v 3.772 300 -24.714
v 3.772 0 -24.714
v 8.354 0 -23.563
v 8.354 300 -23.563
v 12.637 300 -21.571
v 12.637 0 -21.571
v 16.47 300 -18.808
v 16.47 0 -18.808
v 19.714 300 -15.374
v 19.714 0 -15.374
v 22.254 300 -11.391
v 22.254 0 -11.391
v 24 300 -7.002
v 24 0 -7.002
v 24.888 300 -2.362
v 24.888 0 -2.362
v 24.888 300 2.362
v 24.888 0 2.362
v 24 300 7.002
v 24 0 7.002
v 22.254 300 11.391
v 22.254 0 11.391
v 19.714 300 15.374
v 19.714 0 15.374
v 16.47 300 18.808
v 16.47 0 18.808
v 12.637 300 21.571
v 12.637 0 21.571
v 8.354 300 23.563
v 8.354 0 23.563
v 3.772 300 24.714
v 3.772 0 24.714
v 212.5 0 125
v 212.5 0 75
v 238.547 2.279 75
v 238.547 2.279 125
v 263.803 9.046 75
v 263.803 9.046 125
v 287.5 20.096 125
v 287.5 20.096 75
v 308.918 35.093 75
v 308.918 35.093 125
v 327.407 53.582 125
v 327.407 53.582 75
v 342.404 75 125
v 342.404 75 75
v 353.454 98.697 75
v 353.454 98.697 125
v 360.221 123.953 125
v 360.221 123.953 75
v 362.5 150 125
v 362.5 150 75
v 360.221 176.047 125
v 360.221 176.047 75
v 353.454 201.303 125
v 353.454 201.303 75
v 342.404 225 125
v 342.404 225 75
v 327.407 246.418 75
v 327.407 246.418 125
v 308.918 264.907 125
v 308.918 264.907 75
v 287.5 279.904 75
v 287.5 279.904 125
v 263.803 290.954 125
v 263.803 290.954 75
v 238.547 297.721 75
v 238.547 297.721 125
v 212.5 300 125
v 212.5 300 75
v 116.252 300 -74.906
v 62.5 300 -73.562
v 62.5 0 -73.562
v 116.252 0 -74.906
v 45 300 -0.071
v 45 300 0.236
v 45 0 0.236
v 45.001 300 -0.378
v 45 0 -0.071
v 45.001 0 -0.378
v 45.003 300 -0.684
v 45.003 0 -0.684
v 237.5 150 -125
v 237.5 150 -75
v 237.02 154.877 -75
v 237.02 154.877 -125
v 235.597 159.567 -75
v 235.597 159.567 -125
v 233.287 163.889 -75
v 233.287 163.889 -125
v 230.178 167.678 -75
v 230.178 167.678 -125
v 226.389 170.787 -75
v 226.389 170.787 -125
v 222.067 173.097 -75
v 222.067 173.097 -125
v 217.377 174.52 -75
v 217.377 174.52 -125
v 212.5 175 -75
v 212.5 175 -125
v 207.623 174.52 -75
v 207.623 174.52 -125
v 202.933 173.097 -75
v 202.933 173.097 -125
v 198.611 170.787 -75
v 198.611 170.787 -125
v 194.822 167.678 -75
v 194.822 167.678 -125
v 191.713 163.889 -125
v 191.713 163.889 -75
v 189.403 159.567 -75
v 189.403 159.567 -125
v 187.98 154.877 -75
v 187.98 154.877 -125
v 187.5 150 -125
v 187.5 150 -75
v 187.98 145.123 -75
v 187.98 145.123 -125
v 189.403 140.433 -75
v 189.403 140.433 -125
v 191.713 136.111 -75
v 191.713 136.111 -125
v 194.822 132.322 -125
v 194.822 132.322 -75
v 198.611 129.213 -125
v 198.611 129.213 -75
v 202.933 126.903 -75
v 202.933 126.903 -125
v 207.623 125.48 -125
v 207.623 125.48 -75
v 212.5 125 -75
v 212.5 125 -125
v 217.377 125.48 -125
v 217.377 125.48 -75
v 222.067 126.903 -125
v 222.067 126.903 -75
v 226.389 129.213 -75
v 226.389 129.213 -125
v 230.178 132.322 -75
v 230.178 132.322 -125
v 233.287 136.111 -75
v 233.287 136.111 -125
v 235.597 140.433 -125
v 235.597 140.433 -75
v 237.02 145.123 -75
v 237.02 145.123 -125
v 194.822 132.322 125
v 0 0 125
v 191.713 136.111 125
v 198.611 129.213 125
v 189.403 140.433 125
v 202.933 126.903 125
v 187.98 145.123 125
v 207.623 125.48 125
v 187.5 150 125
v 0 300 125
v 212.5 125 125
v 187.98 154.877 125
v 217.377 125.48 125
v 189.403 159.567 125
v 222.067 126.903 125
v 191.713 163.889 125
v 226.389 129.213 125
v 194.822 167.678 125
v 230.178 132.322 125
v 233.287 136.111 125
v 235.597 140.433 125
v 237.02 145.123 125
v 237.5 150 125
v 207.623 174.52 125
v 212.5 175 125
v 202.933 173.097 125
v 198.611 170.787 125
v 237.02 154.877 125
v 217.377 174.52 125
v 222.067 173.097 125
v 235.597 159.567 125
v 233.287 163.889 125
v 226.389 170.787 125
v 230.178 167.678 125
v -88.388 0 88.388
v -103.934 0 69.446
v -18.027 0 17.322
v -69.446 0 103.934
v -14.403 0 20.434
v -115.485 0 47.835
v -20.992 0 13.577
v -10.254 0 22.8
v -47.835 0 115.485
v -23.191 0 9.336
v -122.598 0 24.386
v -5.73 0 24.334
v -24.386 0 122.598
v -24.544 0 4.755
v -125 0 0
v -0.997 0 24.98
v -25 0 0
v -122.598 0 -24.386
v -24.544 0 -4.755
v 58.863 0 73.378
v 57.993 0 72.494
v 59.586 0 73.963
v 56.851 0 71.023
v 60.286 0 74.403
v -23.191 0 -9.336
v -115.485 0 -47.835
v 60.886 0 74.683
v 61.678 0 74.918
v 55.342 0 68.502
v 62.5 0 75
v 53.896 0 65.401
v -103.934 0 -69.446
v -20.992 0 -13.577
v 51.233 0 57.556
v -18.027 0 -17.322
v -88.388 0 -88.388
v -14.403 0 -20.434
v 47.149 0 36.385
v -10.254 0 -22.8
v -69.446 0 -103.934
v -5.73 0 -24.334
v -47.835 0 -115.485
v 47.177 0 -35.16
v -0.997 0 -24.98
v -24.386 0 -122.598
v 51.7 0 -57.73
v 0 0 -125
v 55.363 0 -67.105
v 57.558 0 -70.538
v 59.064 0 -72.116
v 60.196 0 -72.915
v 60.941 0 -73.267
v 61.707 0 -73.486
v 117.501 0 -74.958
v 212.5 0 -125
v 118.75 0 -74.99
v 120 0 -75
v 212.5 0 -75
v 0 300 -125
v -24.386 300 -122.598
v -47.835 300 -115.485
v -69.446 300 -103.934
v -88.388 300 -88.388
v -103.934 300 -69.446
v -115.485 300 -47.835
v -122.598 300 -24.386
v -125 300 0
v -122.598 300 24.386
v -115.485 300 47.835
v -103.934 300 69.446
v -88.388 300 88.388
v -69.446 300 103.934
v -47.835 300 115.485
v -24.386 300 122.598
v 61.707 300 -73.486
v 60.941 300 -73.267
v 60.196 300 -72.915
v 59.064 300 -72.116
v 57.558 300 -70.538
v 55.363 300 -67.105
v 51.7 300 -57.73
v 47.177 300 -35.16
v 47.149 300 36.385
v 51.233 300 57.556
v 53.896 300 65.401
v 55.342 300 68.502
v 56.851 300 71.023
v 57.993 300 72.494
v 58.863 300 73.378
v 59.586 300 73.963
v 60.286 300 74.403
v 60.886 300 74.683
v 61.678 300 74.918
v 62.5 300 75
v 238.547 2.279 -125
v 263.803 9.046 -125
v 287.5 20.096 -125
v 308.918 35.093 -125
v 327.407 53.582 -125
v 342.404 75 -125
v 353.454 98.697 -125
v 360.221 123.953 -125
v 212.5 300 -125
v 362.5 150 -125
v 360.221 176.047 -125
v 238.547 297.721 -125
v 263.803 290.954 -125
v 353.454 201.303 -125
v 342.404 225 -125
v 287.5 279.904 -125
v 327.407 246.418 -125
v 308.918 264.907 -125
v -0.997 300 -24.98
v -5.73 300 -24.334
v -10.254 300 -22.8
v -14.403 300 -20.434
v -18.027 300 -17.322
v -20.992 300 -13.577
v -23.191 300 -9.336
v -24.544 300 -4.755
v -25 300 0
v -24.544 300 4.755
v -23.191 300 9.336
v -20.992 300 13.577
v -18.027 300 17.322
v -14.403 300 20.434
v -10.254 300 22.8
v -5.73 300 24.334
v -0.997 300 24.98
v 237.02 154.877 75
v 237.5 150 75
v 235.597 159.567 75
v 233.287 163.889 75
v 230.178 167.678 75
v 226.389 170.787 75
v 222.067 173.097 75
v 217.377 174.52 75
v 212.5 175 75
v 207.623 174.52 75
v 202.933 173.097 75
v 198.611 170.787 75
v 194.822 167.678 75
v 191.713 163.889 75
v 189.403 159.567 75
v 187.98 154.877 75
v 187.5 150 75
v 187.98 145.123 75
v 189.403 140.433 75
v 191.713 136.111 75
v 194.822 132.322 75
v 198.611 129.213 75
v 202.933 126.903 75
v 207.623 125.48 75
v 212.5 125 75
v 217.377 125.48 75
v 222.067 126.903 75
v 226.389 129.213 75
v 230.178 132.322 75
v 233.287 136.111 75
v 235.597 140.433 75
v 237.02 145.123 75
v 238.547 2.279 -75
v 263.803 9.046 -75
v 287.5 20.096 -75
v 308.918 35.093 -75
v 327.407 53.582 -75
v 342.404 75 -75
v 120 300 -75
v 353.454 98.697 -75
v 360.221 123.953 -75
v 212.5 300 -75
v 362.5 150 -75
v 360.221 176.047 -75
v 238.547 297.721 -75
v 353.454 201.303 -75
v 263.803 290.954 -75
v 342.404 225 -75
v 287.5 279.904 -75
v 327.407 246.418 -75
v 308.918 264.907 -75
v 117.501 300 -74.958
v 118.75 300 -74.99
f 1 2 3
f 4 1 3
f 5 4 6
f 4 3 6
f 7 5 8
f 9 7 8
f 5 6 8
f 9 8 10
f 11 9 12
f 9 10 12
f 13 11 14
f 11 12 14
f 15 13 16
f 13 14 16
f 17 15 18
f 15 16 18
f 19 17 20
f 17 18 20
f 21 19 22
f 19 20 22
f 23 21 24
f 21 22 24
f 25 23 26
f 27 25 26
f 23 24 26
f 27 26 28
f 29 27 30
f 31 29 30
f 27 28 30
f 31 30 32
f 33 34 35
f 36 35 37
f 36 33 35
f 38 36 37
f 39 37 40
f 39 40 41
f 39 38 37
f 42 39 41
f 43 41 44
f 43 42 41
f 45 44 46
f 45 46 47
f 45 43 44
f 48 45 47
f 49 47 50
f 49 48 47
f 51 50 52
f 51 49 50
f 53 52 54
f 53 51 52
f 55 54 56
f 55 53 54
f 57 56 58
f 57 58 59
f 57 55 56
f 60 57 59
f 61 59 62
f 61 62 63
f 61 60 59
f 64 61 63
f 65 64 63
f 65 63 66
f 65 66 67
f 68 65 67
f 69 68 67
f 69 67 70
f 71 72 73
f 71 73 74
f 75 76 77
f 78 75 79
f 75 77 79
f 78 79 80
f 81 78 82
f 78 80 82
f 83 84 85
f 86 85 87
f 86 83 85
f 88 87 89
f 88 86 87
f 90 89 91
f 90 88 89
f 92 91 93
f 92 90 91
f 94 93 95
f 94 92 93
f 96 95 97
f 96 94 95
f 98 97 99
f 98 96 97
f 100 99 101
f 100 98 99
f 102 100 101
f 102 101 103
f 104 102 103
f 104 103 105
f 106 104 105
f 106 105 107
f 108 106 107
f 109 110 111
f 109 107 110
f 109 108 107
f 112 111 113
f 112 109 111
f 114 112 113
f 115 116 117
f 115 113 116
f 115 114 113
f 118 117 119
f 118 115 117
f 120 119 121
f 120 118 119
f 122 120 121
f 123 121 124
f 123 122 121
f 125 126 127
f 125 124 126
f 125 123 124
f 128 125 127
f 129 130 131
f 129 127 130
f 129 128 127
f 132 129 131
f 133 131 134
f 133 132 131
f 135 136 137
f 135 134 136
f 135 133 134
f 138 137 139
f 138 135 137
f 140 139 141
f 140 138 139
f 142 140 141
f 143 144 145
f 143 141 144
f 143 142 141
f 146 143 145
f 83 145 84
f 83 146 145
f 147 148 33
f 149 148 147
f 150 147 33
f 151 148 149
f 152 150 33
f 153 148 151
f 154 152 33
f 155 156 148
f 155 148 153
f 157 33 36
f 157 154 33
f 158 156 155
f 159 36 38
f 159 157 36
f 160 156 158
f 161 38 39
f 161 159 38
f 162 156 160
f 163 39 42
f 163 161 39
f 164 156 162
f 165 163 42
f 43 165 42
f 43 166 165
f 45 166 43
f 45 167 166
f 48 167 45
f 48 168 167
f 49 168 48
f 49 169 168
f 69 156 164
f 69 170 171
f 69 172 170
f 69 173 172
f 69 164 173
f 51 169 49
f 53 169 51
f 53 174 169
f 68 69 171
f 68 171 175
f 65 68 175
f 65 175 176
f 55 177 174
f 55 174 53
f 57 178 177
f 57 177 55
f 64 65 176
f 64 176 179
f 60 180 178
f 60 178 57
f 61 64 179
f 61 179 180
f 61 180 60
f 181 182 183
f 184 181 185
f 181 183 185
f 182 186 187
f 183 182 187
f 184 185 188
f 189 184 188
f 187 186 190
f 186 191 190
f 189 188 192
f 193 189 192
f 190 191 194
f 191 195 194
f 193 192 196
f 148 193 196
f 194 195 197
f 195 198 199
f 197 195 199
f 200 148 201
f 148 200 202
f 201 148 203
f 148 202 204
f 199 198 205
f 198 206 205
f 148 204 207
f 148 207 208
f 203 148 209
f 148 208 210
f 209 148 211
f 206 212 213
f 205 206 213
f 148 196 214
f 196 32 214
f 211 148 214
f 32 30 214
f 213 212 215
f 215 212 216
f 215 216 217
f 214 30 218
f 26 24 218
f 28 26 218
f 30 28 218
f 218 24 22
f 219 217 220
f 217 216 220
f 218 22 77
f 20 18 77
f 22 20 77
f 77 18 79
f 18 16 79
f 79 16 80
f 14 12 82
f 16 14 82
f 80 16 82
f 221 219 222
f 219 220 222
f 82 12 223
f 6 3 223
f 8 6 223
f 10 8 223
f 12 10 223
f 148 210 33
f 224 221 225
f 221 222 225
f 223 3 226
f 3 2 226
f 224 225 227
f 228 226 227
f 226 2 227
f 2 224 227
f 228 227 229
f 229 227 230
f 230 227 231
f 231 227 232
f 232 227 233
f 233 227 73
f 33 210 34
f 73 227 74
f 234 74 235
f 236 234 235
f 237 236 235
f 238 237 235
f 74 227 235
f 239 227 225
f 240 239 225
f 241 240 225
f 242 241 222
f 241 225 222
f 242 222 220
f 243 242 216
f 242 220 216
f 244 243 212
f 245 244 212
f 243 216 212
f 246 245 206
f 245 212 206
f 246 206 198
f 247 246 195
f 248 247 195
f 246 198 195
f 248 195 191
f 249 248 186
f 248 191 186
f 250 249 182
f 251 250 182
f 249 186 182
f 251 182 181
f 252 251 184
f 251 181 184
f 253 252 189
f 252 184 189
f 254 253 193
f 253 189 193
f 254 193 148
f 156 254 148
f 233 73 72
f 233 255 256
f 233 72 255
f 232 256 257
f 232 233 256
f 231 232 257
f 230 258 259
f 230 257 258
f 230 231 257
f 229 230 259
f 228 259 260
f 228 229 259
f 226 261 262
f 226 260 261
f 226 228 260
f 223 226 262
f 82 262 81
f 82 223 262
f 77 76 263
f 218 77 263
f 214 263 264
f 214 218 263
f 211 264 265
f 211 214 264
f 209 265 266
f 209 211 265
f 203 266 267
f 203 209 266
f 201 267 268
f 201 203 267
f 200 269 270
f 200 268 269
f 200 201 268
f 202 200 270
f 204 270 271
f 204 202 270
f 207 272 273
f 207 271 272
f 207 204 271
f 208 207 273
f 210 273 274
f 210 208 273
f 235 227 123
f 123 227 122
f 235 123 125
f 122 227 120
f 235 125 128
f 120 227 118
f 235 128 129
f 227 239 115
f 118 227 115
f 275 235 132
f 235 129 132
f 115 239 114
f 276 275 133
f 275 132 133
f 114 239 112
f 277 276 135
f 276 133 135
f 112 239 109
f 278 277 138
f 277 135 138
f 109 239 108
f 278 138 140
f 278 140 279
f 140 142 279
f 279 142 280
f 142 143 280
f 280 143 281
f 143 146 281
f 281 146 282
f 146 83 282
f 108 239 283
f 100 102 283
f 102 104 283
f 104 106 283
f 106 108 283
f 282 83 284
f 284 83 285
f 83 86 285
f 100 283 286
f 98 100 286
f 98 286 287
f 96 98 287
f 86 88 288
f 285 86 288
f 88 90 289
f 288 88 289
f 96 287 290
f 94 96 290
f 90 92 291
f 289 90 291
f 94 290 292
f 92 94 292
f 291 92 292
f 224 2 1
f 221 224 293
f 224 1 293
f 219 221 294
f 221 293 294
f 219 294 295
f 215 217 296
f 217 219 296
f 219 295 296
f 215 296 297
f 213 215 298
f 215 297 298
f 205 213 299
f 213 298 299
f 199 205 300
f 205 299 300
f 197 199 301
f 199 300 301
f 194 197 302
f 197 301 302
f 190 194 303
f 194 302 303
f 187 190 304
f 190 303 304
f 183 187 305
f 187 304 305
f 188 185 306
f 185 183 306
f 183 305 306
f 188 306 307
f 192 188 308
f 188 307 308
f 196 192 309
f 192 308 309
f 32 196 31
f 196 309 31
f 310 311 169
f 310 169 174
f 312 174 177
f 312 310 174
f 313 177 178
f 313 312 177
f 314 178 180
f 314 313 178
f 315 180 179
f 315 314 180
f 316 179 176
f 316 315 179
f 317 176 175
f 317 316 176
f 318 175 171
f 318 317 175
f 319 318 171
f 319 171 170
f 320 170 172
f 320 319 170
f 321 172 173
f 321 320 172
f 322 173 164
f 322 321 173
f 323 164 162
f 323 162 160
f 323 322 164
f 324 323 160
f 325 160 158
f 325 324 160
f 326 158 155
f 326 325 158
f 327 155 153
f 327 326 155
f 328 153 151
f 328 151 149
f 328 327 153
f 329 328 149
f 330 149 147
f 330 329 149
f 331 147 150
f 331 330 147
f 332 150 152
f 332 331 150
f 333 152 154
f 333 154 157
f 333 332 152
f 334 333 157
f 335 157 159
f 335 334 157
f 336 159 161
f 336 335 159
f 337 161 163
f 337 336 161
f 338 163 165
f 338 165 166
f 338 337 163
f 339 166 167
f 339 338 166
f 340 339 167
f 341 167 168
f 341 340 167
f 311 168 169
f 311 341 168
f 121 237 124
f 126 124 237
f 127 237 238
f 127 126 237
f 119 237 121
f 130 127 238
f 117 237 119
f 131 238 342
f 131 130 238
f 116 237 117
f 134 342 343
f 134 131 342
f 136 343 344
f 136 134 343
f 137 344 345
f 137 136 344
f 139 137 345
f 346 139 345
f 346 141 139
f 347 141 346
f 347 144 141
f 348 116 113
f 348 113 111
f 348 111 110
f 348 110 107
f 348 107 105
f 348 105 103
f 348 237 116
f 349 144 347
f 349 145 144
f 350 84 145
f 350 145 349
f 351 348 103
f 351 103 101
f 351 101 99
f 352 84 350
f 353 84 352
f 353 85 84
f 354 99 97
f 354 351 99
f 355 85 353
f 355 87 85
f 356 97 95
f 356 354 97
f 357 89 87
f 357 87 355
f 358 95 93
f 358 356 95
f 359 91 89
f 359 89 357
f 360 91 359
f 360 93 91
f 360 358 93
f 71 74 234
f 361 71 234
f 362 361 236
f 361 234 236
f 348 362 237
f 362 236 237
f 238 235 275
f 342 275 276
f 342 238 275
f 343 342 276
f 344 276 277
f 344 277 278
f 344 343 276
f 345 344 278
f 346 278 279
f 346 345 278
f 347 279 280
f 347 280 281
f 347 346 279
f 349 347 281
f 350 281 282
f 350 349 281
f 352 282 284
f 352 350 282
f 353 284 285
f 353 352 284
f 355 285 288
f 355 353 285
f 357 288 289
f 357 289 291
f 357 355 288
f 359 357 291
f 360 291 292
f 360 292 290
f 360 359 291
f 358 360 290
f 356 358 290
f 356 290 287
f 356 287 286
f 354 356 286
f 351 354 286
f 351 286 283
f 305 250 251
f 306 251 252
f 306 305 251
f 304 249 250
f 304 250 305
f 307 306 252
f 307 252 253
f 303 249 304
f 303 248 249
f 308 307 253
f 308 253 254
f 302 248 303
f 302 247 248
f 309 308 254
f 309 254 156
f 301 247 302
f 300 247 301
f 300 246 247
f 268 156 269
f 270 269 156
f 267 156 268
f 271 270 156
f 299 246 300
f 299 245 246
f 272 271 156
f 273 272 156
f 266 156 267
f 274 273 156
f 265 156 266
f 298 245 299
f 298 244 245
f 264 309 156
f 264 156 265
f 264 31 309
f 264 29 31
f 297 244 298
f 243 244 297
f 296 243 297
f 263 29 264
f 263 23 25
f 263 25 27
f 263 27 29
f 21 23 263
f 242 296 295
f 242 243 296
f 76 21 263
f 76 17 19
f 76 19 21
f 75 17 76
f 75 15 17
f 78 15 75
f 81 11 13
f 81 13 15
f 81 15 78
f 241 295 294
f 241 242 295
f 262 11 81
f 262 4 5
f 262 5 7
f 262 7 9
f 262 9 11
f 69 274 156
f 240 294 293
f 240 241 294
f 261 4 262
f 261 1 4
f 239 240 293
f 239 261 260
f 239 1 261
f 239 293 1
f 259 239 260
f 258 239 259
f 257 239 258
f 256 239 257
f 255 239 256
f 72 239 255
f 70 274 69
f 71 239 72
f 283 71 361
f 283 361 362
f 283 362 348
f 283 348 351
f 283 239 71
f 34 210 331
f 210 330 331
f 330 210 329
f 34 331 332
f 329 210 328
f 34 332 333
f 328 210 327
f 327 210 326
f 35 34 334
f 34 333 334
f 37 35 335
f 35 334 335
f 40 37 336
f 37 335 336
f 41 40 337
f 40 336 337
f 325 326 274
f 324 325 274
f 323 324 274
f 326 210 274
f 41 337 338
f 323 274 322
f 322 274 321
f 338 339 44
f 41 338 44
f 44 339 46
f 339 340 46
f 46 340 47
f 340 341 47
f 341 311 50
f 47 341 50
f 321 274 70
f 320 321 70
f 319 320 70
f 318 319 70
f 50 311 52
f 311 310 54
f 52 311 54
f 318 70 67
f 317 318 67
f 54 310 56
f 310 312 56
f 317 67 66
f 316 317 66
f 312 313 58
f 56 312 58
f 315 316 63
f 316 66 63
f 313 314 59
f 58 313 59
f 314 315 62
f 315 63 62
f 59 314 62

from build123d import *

# Parameters (mm, degrees)
SKETCH1_R               = 125
SKETCH1_R_2             = 25
BOSS_EXTRUDE1_DEPTH     = 300
SKETCH2_R               = 25
BOSS_EXTRUDE2_DEPTH     = 125
CUT_EXTRUDE2_DEPTH      = 75
BOSS_EXTRUDE3_DEPTH     = 300
SKETCH6_R               = 25
CUT_EXTRUDE3_DEPTH      = 487.858552354
CUT_EXTRUDE4_DEPTH      = 487.858552354
CUT_EXTRUDE4_DEPTH_BACK = 487.858552354


with BuildPart() as part:
    # Sketch1 → Boss-Extrude1 (new body)
    with BuildSketch(Plane(origin=(0, 0, 0), x_dir=(1, 0, 0), z_dir=(0, 1, 0))):
        with Locations(Location((0, 0, 0), (0, 0, 270))):
            Circle(SKETCH1_R)
        with Locations(Location((0, 0, 0), (0, 0, 270))):
            Circle(SKETCH1_R_2, mode=Mode.SUBTRACT)
    extrude(amount=BOSS_EXTRUDE1_DEPTH)

    # Sketch2 → Boss-Extrude2 (add, symmetric)
    with BuildSketch(Plane.XY):
        with BuildLine():
            Line((0, 300), (0, 0))
            Line((0, 0), (212.5, 0))
            ThreePointArc((212.5, 0), (362.5, 150), (212.5, 300))
            Line((212.5, 300), (0, 300))
        make_face()
        with Locations((212.5, 150)):
            Circle(SKETCH2_R, mode=Mode.SUBTRACT)
    extrude(amount=BOSS_EXTRUDE2_DEPTH, both=True)

    # Sketch4 → Cut-Extrude2 (cut, symmetric)
    with BuildSketch(Plane.XY):
        with BuildLine():
            Line((3.772306617, 300), (3.772306617, 0))
            Line((3.772306617, 0), (150, 0))
            ThreePointArc((150, 0), (375, 150), (150, 300))
            Line((150, 300), (3.772306617, 300))
        make_face()
    extrude(amount=CUT_EXTRUDE2_DEPTH, both=True, mode=Mode.SUBTRACT)

    # Sketch5 → Boss-Extrude3 (add, through all)
    with BuildSketch(Plane(origin=(0, 0, 0), x_dir=(1, 0, 0), z_dir=(0, 1, 0))):
        with BuildLine():
            Line((120, 75), (3.772306617, 75))
            Line((3.772306617, 75), (3.772306617, 24.713755336))
            ThreePointArc((3.772306617, 24.713755336), (18.964541458, 16.28944957), (25, 0))
            ThreePointArc((25, 0), (18.964541458, -16.28944957), (3.772306617, -24.713755336))
            Line((3.772306617, -24.713755336), (3.772306617, -75))
            Line((3.772306617, -75), (120, -75))
            ThreePointArc((120, -75), (45, 0), (120, 75))
        make_face()
    extrude(amount=BOSS_EXTRUDE3_DEPTH)

    # Sketch6 → Cut-Extrude3 (cut, through all)
    with BuildSketch(Plane(origin=(0, 300, 0), x_dir=(1, 0, 0), z_dir=(0, 1, 0))):
        with Locations(Location((0, 0, 0), (0, 0, 270))):
            Circle(SKETCH6_R)
    extrude(amount=-CUT_EXTRUDE3_DEPTH, mode=Mode.SUBTRACT)

    # Sketch10 → Cut-Extrude4 (cut, two sides: drawn at the far end of the back side and taken through both)
    with BuildSketch(Plane(origin=(0, 0, 0), x_dir=(1, 0, 0), z_dir=(0, 1, 0)).offset(-CUT_EXTRUDE4_DEPTH_BACK)):
        with BuildLine():
            Line((62.5, 73.562310608), (120, 75))
            Line((120, 75), (120, -75))
            Line((120, -75), (62.5, -75))
            add(Edge.make_bspline(
                [(62.5, 73.562310608), (45, 73.562310608), (45, -0.718844696), (45, -75), (62.5, -75)],
                knots=[0, 0, 0, 1.570796327, 1.570796327, 3.141592654, 3.141592654, 3.141592654], degree=2, weights=[1, 0.707106781, 1, 0.707106781, 1]))
        make_face()
    extrude(amount=CUT_EXTRUDE4_DEPTH + CUT_EXTRUDE4_DEPTH_BACK, mode=Mode.SUBTRACT)


solid = part.part
